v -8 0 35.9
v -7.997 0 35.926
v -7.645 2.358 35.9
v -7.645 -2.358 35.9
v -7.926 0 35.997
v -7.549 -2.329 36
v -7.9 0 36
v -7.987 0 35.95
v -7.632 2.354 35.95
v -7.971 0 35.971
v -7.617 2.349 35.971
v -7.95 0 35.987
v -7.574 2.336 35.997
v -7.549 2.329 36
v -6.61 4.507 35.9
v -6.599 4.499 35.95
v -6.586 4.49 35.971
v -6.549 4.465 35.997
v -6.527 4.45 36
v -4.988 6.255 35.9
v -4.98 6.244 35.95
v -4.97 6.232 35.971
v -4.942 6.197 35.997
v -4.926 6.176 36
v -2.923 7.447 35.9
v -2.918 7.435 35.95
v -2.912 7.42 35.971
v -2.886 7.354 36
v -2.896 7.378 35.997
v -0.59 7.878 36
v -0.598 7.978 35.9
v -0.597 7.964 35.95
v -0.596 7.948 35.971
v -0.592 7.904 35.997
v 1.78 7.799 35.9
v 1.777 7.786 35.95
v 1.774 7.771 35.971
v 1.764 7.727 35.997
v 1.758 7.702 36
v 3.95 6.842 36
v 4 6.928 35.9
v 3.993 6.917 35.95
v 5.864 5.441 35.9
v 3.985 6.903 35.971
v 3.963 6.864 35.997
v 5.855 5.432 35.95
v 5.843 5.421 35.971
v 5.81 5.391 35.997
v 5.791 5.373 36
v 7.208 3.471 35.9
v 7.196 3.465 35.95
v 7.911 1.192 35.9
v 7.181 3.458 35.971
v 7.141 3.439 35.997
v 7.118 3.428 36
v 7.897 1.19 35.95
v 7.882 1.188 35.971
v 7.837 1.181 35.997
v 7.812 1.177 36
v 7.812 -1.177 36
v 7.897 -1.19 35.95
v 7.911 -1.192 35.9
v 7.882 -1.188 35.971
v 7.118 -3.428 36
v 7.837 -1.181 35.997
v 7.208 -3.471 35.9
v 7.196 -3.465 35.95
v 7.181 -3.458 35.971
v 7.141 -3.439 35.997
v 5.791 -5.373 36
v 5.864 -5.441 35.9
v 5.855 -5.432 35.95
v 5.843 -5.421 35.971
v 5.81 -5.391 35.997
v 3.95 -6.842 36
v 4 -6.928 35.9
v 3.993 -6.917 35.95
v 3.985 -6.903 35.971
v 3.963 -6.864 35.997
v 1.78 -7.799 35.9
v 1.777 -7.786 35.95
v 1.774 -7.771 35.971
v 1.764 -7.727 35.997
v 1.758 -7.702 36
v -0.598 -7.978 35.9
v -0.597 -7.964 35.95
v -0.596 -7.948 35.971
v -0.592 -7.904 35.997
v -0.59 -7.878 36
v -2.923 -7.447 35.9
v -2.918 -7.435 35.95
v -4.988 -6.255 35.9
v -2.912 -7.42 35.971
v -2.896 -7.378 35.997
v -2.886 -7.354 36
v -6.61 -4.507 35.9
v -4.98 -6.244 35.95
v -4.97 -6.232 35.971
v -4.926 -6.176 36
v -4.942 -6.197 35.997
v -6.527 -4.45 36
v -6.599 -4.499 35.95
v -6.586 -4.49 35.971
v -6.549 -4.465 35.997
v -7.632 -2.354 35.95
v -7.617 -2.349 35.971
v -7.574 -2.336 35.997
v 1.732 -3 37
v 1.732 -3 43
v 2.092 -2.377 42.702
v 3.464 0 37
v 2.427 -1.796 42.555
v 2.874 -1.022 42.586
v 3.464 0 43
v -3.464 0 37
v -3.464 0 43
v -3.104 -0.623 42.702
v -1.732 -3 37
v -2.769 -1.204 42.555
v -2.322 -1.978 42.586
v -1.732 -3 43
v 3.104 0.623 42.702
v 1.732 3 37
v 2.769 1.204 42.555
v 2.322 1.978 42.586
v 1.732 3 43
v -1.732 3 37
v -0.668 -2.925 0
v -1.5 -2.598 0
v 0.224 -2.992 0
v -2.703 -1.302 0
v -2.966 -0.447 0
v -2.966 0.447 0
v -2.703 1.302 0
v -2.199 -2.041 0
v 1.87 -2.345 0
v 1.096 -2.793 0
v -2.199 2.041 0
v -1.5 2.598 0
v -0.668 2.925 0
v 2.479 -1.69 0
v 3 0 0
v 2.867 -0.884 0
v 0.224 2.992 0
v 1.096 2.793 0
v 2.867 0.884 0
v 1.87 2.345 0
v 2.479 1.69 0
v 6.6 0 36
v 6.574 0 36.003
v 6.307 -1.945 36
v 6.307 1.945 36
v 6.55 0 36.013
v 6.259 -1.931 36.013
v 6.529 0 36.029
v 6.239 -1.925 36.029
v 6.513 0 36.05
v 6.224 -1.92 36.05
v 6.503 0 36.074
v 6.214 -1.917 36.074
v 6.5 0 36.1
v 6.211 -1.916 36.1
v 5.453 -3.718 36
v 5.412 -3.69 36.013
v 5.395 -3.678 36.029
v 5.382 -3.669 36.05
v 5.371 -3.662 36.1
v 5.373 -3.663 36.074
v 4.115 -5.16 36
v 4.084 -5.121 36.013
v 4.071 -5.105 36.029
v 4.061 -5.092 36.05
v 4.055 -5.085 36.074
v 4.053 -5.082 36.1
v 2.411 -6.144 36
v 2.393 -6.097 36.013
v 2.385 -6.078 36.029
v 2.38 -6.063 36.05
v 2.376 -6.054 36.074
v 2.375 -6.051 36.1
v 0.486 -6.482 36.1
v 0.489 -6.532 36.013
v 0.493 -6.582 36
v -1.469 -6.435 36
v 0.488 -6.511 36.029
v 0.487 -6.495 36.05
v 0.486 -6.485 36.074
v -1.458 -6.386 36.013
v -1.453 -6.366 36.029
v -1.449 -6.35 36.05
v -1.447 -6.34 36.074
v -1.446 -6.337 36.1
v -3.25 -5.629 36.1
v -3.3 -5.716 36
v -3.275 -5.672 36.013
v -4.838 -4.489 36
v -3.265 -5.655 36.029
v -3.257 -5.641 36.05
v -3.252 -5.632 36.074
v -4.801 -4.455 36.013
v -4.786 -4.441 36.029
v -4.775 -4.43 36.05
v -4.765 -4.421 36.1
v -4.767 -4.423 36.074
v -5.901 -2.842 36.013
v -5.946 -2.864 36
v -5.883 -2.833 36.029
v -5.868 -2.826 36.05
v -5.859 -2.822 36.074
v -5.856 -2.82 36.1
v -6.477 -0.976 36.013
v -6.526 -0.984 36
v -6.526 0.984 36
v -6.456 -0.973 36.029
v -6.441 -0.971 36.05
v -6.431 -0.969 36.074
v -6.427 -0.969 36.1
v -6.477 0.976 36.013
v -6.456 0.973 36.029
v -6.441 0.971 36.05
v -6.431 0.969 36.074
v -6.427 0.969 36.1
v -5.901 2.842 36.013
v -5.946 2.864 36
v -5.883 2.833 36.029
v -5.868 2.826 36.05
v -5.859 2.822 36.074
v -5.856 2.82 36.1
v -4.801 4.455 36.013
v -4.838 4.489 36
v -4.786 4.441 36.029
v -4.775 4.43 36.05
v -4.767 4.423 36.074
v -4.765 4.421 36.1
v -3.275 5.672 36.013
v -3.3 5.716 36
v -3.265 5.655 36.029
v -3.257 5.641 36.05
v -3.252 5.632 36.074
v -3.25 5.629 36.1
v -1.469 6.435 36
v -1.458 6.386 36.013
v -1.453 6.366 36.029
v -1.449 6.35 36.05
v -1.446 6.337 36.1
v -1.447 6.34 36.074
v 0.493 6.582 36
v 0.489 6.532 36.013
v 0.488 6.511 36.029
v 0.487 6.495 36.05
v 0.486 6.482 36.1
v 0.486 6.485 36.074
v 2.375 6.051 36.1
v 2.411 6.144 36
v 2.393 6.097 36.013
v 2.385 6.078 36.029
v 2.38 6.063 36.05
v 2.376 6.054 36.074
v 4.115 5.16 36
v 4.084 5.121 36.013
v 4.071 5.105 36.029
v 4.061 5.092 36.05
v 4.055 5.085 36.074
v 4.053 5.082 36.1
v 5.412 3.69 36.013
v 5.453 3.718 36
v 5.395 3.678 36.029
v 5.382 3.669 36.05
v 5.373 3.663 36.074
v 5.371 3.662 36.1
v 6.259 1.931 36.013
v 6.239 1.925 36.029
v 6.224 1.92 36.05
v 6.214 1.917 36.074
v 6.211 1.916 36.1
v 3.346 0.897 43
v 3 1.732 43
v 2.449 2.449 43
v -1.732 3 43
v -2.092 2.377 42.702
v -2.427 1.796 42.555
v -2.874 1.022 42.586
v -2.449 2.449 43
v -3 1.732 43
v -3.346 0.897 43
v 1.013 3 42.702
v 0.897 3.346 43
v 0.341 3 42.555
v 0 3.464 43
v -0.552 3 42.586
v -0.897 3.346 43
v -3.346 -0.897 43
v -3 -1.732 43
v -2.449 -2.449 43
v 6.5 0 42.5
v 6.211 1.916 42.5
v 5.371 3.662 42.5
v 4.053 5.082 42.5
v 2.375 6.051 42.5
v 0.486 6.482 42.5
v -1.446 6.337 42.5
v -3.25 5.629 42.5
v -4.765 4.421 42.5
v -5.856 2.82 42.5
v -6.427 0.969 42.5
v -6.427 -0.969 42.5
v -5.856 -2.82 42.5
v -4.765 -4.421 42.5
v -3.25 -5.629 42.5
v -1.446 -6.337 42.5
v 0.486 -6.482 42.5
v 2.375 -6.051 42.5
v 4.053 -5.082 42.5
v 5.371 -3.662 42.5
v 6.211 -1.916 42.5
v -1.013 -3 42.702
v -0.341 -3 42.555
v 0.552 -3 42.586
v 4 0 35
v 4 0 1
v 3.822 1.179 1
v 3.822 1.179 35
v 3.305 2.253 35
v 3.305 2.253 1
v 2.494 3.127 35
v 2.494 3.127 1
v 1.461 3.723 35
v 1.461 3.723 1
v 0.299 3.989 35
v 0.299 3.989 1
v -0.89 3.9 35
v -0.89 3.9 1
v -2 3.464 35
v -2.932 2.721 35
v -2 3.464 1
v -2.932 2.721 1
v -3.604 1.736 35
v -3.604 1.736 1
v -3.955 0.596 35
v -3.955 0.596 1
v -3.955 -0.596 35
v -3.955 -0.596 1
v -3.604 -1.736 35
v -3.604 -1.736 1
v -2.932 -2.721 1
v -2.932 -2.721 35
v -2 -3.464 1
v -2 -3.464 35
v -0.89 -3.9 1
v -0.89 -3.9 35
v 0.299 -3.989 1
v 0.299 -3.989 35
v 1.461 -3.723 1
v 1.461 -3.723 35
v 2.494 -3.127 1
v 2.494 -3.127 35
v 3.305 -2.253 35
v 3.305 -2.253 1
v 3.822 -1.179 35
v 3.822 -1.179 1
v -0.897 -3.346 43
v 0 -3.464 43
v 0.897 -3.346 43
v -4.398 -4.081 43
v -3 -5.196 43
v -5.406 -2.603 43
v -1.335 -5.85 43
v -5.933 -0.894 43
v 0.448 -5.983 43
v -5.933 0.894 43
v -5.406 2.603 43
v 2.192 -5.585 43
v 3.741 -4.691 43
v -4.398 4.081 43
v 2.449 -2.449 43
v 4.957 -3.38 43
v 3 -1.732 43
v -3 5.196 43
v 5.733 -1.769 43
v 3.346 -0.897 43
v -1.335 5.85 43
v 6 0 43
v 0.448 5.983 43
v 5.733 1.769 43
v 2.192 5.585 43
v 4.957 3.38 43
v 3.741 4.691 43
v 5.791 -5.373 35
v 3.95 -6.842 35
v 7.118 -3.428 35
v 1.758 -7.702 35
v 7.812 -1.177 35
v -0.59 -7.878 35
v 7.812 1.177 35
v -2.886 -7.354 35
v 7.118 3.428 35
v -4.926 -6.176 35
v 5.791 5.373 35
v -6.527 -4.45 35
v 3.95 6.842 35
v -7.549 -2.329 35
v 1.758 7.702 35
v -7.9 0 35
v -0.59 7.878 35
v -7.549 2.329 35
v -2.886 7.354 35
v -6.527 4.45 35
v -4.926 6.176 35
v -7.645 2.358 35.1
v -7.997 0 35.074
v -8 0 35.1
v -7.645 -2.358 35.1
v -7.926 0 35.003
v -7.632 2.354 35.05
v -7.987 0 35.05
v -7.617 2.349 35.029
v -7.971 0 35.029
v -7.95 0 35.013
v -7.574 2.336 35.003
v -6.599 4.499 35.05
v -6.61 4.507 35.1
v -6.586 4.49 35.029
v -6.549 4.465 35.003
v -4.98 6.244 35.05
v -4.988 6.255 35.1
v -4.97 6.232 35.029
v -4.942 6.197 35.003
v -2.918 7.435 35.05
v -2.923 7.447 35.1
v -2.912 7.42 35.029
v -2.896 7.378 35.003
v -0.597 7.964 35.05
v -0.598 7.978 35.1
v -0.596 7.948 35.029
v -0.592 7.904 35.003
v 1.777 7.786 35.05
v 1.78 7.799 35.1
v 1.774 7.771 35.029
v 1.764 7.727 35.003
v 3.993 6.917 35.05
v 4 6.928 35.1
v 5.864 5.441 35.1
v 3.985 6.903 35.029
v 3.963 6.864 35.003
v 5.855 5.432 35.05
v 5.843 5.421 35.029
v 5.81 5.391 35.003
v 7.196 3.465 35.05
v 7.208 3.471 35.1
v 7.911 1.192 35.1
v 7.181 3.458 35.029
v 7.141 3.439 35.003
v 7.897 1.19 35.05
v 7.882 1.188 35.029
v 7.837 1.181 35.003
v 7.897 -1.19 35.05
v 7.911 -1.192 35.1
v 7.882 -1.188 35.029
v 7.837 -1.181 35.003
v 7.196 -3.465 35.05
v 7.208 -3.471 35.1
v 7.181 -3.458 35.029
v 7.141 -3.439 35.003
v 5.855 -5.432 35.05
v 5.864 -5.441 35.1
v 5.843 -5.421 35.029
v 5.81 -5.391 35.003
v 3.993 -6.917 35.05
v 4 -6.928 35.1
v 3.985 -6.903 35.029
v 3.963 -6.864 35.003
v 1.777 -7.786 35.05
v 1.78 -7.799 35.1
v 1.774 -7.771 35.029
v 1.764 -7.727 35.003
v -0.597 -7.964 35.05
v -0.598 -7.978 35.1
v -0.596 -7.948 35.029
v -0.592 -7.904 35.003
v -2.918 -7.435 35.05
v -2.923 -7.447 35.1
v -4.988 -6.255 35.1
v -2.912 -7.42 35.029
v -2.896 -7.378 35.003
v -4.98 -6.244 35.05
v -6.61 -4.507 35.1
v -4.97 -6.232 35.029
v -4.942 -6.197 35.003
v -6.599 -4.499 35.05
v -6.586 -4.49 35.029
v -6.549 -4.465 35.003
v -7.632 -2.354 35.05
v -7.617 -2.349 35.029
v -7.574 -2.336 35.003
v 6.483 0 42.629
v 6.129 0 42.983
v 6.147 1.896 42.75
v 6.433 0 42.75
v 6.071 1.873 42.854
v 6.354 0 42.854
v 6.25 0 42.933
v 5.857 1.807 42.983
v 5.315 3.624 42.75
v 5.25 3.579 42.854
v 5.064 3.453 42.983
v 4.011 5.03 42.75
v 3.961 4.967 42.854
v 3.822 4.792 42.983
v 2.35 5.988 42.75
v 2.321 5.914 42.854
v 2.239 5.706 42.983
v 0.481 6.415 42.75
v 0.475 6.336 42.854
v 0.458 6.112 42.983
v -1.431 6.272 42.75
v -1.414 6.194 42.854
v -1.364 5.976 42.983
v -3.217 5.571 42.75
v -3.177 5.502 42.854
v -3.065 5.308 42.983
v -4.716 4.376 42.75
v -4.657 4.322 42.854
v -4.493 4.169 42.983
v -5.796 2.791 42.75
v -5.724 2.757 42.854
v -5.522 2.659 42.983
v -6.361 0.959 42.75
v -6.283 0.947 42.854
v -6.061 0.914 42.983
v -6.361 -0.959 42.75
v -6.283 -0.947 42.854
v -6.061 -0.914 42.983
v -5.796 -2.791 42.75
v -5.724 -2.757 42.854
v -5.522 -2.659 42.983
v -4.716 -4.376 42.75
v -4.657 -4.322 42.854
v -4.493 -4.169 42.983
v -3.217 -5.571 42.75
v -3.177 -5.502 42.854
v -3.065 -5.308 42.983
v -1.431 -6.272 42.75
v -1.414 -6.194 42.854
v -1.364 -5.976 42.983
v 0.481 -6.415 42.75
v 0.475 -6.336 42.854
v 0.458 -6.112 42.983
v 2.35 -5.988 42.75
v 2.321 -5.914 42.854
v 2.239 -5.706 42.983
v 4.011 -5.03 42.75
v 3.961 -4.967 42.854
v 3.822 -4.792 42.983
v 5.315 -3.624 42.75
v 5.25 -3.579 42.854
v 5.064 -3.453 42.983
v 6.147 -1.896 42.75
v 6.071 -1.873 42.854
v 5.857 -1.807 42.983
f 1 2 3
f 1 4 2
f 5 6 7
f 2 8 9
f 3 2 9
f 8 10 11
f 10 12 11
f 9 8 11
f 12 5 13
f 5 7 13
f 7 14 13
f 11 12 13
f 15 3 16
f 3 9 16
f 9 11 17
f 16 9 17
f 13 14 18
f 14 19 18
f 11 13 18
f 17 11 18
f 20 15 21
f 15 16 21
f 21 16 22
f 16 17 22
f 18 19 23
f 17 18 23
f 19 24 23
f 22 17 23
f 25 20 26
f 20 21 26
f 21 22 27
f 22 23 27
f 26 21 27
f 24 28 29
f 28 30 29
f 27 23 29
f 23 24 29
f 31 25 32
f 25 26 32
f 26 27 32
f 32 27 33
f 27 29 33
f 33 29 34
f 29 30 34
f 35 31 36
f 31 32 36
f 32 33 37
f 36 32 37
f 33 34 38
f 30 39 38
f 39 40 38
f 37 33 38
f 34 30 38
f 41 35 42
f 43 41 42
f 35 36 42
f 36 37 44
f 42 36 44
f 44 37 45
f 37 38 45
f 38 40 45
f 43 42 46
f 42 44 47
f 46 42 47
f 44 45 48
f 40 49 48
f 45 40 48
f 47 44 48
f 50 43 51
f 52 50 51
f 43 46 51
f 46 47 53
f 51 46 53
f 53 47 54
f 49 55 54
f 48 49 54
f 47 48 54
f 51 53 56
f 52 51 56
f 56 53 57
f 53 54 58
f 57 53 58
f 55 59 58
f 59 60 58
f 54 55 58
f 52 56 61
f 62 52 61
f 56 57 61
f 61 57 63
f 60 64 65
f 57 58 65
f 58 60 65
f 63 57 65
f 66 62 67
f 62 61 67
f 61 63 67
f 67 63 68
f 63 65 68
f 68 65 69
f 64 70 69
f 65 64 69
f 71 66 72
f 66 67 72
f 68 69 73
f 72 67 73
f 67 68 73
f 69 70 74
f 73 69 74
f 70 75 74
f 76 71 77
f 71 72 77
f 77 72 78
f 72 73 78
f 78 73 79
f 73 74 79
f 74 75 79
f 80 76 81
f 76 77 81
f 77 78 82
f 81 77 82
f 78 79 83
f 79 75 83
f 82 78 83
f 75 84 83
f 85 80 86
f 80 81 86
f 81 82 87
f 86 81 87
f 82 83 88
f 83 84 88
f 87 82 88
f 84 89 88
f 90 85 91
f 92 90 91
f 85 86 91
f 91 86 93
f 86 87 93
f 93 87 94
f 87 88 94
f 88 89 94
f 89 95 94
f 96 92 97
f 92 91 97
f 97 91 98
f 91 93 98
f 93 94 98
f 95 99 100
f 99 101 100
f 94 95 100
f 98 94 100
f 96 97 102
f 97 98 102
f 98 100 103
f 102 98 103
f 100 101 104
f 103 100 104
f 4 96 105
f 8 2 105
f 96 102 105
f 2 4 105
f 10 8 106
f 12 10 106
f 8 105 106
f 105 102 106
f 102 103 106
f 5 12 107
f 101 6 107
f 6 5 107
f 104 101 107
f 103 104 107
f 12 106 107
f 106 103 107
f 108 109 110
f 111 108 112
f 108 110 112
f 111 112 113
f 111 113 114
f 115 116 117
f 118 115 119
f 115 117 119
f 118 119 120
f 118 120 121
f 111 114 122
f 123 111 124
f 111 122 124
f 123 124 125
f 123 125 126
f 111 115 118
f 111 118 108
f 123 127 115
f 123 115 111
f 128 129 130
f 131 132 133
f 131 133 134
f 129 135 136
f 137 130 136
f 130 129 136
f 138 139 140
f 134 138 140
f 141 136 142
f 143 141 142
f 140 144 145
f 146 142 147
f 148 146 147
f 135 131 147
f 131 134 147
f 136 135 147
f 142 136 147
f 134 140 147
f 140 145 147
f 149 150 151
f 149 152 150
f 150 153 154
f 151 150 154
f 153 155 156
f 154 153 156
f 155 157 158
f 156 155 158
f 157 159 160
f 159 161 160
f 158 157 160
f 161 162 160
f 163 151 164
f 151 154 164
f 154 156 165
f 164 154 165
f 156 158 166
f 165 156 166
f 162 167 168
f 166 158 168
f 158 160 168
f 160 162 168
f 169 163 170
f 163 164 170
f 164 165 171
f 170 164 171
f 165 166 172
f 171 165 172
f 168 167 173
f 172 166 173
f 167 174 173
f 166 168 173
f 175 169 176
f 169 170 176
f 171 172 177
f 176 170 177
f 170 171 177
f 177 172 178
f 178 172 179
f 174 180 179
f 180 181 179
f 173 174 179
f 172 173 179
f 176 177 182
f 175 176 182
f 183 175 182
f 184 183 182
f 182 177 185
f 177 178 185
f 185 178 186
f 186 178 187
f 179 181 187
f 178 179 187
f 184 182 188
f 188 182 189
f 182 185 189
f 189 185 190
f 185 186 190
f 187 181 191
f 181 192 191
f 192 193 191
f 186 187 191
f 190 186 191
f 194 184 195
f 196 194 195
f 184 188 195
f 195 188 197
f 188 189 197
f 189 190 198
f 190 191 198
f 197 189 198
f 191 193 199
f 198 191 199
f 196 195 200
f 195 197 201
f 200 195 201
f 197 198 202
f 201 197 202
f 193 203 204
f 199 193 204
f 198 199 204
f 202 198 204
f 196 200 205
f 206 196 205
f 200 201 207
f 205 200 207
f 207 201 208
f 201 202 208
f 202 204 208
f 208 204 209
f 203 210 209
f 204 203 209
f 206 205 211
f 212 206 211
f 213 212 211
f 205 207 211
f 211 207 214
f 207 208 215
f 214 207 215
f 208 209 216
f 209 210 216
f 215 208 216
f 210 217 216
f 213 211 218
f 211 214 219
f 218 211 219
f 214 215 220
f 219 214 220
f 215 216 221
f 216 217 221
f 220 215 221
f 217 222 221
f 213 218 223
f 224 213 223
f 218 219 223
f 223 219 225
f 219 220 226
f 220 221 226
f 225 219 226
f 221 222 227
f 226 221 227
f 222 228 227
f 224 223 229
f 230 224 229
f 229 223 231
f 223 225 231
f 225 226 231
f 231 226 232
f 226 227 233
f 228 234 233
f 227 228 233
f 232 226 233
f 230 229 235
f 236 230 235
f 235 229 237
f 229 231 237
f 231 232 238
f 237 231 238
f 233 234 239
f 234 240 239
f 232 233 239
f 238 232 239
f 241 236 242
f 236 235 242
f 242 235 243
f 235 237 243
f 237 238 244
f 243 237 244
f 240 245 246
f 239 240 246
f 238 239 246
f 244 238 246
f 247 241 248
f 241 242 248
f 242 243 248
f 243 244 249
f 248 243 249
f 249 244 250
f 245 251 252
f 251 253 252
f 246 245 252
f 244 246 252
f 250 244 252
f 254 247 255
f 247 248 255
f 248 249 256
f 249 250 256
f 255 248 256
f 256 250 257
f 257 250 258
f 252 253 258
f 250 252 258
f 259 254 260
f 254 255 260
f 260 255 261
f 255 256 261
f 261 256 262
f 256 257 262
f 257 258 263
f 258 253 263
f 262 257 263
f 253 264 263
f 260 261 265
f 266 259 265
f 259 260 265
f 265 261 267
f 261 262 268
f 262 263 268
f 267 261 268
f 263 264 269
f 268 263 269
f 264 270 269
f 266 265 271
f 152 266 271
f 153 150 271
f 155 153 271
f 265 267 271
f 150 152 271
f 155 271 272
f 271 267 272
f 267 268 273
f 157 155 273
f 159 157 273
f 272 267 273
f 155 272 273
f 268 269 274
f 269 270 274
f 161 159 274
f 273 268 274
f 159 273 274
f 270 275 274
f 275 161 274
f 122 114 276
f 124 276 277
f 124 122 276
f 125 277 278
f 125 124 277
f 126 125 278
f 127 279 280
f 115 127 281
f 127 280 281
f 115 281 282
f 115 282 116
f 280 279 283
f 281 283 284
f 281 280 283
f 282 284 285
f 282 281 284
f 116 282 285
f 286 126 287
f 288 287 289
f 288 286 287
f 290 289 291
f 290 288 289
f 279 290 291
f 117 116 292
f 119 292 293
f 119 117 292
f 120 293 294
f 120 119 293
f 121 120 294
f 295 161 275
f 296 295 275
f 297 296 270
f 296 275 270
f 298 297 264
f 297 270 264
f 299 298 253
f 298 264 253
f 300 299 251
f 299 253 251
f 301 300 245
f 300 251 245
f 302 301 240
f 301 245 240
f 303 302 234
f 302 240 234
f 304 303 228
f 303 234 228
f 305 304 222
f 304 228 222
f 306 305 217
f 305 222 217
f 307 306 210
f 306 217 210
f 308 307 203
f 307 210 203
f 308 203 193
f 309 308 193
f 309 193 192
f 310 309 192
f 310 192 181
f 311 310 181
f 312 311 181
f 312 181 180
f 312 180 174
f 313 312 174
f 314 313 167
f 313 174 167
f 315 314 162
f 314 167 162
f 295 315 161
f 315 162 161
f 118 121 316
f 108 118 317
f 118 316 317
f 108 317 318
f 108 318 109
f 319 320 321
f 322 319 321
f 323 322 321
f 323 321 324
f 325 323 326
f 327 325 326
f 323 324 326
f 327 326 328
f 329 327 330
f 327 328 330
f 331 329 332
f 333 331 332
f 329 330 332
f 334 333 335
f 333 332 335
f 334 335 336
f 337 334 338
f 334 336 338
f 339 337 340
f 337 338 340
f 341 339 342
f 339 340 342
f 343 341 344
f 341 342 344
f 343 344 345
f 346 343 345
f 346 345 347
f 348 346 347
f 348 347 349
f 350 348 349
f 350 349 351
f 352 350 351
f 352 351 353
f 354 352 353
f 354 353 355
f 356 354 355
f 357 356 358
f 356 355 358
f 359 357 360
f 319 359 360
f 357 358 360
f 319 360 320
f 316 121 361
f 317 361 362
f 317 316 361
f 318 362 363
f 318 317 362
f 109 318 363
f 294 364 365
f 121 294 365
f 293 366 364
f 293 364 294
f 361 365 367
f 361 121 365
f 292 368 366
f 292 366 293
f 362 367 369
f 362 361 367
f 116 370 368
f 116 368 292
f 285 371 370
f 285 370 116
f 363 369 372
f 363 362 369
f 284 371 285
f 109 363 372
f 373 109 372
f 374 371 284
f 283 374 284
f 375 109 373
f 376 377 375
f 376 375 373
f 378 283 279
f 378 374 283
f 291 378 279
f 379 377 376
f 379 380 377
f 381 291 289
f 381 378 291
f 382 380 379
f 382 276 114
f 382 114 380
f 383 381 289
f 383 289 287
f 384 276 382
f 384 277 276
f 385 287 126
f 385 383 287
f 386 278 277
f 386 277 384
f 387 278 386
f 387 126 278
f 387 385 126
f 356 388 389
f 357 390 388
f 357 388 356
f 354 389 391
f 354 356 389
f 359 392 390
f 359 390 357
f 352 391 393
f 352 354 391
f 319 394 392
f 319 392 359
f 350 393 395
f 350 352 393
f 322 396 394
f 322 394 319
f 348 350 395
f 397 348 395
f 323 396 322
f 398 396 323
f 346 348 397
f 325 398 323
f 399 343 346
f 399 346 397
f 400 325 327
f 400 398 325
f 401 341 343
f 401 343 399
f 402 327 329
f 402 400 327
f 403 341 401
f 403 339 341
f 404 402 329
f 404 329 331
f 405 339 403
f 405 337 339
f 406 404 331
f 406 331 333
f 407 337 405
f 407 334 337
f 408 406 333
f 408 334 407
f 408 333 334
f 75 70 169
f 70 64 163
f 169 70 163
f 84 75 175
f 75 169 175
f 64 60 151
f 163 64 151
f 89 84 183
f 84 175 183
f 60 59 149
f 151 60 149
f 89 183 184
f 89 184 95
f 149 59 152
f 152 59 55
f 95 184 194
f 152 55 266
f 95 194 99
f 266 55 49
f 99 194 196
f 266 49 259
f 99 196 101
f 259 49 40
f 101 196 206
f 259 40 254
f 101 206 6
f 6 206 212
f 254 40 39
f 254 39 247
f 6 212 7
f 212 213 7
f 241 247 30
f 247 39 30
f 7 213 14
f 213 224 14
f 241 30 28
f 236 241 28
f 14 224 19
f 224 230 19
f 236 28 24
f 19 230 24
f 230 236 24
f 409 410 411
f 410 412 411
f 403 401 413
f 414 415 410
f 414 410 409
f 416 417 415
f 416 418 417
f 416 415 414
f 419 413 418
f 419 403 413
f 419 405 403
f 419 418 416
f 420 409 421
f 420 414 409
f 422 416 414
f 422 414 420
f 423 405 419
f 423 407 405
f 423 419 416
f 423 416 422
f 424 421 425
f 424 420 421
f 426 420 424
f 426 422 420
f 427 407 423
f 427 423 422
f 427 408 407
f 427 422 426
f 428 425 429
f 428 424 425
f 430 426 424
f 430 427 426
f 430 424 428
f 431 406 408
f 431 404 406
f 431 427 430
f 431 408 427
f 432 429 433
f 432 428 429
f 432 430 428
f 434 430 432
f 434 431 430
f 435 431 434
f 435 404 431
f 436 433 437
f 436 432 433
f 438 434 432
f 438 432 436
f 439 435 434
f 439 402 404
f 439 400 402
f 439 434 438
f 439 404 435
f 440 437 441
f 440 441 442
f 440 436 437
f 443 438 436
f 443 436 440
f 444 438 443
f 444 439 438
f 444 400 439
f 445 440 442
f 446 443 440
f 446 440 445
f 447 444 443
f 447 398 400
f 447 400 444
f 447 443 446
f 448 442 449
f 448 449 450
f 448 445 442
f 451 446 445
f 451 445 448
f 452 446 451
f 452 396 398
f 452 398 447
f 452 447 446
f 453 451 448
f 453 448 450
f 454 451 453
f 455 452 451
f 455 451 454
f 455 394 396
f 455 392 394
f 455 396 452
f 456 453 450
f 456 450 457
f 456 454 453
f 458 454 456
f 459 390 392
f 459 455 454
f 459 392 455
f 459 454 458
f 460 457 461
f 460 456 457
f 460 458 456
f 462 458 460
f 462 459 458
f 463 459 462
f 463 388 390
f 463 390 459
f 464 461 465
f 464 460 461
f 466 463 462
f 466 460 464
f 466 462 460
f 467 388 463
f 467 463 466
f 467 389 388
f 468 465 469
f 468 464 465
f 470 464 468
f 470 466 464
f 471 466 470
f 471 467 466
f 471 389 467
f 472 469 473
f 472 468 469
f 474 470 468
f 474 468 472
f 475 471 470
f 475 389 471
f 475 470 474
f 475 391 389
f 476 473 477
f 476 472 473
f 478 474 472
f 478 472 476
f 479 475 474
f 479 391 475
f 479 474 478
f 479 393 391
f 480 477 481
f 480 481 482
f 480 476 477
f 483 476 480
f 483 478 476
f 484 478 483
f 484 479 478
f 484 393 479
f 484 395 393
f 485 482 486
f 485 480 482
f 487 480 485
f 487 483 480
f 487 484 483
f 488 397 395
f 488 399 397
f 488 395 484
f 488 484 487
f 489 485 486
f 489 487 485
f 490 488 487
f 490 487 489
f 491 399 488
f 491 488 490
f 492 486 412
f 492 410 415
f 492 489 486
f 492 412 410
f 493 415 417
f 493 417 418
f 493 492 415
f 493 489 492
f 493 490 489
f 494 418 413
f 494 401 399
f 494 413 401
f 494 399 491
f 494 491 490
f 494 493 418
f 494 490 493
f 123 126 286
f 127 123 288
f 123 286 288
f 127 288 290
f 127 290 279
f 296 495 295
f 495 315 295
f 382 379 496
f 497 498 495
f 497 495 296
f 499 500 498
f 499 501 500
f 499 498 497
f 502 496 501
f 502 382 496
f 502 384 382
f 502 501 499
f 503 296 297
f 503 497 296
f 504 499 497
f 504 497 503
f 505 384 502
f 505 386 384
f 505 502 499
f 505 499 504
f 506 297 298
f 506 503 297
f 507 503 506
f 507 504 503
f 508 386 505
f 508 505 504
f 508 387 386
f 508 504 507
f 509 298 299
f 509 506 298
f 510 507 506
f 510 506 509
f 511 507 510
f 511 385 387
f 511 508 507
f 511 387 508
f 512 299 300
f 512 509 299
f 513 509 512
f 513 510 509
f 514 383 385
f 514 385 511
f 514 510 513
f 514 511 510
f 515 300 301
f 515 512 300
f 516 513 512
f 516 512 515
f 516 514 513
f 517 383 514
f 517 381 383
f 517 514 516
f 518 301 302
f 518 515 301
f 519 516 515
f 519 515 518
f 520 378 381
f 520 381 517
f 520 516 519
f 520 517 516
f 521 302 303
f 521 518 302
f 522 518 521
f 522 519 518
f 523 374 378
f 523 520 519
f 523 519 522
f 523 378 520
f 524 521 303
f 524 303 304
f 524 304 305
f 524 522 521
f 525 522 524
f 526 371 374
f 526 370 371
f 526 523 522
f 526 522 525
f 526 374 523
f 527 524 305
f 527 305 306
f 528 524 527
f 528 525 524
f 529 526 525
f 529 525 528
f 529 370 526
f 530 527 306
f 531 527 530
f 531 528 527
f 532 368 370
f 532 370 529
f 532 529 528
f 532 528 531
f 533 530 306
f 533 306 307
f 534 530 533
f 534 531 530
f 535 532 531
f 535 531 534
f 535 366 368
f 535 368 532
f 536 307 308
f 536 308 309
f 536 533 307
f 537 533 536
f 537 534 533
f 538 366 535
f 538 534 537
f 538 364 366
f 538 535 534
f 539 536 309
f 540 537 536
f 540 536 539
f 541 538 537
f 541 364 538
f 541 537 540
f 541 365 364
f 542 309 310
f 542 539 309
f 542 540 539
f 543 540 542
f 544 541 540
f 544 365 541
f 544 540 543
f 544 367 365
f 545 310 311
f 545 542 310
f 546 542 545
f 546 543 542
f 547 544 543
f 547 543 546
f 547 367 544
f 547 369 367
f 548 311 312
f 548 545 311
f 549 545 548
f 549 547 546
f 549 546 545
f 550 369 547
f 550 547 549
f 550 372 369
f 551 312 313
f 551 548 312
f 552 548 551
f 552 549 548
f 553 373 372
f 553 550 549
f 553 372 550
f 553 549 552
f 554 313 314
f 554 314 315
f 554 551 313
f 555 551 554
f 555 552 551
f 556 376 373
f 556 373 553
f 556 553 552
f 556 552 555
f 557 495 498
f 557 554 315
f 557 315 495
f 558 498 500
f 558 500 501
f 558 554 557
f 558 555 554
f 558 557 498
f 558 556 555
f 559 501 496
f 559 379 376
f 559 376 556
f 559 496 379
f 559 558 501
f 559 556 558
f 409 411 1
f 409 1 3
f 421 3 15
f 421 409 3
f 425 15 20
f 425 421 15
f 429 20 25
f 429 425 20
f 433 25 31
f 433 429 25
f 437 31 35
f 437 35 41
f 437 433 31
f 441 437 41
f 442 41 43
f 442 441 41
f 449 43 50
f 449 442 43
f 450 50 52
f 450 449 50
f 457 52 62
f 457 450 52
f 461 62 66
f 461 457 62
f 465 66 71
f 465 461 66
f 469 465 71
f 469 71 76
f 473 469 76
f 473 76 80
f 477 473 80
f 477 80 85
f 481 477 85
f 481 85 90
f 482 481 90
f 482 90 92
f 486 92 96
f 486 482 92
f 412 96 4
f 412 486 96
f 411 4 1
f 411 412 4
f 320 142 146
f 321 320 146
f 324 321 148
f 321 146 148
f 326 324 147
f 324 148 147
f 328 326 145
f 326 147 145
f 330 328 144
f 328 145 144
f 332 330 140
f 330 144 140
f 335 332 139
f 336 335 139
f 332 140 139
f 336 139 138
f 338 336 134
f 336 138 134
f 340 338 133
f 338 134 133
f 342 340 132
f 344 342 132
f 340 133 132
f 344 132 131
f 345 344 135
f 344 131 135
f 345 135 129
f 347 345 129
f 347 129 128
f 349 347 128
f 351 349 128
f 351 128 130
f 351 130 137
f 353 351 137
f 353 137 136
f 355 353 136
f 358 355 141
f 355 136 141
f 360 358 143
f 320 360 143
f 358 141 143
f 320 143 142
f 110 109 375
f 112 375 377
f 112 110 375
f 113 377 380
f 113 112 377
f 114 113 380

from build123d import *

# Parameters (mm, degrees)
SCHIZZO1_R                   = 4
ESTRUSIONE_ESTRUSIONE1_DEPTH = 35
SMUSSO1_SIZE                 = 1
SCHIZZO6_R                   = 6.5
ESTRUSIONE_ESTRUSIONE3_DEPTH = 8
TAGLIO_ESTRUSIONE3_DEPTH     = 6
SCHIZZO8_R                   = 3.464101615
TAGLIO_ESTRUSIONE4_DEPTH     = 1
TAGLIO_ESTRUSIONE4_TAPER     = 45
RACCORDO1_R                  = 0.5
SCHIZZO9_R                   = 8
SCHIZZO9_R_2                 = 6.5
ESTRUSIONE_ESTRUSIONE4_DEPTH = 1
RACCORDO2_R                  = 0.1


with BuildPart() as part:
    # Schizzo1 → Estrusione-Estrusione1 (new body)
    with BuildSketch(Plane.XY):
        Circle(SCHIZZO1_R)
    extrude(amount=ESTRUSIONE_ESTRUSIONE1_DEPTH)

    # Smusso1
    smusso1_edges = [part.edges().sort_by_distance(p)[0] for p in [
        (-4, 0, 0),
    ]]
    chamfer(smusso1_edges, length=SMUSSO1_SIZE)

    # Schizzo6 → Estrusione-Estrusione3 (add)
    with BuildSketch(Plane.XY.offset(35)):
        Circle(SCHIZZO6_R)
    extrude(amount=ESTRUSIONE_ESTRUSIONE3_DEPTH)

    # Schizzo7 → Taglio-Estrusione3 (cut)
    with BuildSketch(Plane.XY.offset(43)):
        Polygon((1.732050808, 3), (-1.732050808, 3), (-3.464101615, 0), (-1.732050808, -3), (1.732050808, -3), (3.464101615, 0), align=None)
    extrude(amount=-TAGLIO_ESTRUSIONE3_DEPTH, mode=Mode.SUBTRACT)

    # Schizzo8 → Taglio-Estrusione4 (cut)
    with BuildSketch(Plane.XY.offset(43)):
        Circle(SCHIZZO8_R)
    extrude(amount=-TAGLIO_ESTRUSIONE4_DEPTH, taper=TAGLIO_ESTRUSIONE4_TAPER, mode=Mode.SUBTRACT)

    # Raccordo1
    raccordo1_edges = [part.edges().sort_by_distance(p)[0] for p in [
        (-6.5, 0, 43),
    ]]
    fillet(raccordo1_edges, radius=RACCORDO1_R)

    # Schizzo9 → Estrusione-Estrusione4 (add)
    with BuildSketch(Plane(origin=(0, 0, 35), x_dir=(-1, 0, 0), z_dir=(0, 0, -1))):
        Circle(SCHIZZO9_R)
        Circle(SCHIZZO9_R_2, mode=Mode.SUBTRACT)
    extrude(amount=-ESTRUSIONE_ESTRUSIONE4_DEPTH)

    # Raccordo2
    raccordo2_edges = [part.edges().sort_by_distance(p)[0] for p in [
        (-6.5, 0, 36),
        (8, 0, 36),
        (8, 0, 35),
    ]]
    fillet(raccordo2_edges, radius=RACCORDO2_R)


solid = part.part
